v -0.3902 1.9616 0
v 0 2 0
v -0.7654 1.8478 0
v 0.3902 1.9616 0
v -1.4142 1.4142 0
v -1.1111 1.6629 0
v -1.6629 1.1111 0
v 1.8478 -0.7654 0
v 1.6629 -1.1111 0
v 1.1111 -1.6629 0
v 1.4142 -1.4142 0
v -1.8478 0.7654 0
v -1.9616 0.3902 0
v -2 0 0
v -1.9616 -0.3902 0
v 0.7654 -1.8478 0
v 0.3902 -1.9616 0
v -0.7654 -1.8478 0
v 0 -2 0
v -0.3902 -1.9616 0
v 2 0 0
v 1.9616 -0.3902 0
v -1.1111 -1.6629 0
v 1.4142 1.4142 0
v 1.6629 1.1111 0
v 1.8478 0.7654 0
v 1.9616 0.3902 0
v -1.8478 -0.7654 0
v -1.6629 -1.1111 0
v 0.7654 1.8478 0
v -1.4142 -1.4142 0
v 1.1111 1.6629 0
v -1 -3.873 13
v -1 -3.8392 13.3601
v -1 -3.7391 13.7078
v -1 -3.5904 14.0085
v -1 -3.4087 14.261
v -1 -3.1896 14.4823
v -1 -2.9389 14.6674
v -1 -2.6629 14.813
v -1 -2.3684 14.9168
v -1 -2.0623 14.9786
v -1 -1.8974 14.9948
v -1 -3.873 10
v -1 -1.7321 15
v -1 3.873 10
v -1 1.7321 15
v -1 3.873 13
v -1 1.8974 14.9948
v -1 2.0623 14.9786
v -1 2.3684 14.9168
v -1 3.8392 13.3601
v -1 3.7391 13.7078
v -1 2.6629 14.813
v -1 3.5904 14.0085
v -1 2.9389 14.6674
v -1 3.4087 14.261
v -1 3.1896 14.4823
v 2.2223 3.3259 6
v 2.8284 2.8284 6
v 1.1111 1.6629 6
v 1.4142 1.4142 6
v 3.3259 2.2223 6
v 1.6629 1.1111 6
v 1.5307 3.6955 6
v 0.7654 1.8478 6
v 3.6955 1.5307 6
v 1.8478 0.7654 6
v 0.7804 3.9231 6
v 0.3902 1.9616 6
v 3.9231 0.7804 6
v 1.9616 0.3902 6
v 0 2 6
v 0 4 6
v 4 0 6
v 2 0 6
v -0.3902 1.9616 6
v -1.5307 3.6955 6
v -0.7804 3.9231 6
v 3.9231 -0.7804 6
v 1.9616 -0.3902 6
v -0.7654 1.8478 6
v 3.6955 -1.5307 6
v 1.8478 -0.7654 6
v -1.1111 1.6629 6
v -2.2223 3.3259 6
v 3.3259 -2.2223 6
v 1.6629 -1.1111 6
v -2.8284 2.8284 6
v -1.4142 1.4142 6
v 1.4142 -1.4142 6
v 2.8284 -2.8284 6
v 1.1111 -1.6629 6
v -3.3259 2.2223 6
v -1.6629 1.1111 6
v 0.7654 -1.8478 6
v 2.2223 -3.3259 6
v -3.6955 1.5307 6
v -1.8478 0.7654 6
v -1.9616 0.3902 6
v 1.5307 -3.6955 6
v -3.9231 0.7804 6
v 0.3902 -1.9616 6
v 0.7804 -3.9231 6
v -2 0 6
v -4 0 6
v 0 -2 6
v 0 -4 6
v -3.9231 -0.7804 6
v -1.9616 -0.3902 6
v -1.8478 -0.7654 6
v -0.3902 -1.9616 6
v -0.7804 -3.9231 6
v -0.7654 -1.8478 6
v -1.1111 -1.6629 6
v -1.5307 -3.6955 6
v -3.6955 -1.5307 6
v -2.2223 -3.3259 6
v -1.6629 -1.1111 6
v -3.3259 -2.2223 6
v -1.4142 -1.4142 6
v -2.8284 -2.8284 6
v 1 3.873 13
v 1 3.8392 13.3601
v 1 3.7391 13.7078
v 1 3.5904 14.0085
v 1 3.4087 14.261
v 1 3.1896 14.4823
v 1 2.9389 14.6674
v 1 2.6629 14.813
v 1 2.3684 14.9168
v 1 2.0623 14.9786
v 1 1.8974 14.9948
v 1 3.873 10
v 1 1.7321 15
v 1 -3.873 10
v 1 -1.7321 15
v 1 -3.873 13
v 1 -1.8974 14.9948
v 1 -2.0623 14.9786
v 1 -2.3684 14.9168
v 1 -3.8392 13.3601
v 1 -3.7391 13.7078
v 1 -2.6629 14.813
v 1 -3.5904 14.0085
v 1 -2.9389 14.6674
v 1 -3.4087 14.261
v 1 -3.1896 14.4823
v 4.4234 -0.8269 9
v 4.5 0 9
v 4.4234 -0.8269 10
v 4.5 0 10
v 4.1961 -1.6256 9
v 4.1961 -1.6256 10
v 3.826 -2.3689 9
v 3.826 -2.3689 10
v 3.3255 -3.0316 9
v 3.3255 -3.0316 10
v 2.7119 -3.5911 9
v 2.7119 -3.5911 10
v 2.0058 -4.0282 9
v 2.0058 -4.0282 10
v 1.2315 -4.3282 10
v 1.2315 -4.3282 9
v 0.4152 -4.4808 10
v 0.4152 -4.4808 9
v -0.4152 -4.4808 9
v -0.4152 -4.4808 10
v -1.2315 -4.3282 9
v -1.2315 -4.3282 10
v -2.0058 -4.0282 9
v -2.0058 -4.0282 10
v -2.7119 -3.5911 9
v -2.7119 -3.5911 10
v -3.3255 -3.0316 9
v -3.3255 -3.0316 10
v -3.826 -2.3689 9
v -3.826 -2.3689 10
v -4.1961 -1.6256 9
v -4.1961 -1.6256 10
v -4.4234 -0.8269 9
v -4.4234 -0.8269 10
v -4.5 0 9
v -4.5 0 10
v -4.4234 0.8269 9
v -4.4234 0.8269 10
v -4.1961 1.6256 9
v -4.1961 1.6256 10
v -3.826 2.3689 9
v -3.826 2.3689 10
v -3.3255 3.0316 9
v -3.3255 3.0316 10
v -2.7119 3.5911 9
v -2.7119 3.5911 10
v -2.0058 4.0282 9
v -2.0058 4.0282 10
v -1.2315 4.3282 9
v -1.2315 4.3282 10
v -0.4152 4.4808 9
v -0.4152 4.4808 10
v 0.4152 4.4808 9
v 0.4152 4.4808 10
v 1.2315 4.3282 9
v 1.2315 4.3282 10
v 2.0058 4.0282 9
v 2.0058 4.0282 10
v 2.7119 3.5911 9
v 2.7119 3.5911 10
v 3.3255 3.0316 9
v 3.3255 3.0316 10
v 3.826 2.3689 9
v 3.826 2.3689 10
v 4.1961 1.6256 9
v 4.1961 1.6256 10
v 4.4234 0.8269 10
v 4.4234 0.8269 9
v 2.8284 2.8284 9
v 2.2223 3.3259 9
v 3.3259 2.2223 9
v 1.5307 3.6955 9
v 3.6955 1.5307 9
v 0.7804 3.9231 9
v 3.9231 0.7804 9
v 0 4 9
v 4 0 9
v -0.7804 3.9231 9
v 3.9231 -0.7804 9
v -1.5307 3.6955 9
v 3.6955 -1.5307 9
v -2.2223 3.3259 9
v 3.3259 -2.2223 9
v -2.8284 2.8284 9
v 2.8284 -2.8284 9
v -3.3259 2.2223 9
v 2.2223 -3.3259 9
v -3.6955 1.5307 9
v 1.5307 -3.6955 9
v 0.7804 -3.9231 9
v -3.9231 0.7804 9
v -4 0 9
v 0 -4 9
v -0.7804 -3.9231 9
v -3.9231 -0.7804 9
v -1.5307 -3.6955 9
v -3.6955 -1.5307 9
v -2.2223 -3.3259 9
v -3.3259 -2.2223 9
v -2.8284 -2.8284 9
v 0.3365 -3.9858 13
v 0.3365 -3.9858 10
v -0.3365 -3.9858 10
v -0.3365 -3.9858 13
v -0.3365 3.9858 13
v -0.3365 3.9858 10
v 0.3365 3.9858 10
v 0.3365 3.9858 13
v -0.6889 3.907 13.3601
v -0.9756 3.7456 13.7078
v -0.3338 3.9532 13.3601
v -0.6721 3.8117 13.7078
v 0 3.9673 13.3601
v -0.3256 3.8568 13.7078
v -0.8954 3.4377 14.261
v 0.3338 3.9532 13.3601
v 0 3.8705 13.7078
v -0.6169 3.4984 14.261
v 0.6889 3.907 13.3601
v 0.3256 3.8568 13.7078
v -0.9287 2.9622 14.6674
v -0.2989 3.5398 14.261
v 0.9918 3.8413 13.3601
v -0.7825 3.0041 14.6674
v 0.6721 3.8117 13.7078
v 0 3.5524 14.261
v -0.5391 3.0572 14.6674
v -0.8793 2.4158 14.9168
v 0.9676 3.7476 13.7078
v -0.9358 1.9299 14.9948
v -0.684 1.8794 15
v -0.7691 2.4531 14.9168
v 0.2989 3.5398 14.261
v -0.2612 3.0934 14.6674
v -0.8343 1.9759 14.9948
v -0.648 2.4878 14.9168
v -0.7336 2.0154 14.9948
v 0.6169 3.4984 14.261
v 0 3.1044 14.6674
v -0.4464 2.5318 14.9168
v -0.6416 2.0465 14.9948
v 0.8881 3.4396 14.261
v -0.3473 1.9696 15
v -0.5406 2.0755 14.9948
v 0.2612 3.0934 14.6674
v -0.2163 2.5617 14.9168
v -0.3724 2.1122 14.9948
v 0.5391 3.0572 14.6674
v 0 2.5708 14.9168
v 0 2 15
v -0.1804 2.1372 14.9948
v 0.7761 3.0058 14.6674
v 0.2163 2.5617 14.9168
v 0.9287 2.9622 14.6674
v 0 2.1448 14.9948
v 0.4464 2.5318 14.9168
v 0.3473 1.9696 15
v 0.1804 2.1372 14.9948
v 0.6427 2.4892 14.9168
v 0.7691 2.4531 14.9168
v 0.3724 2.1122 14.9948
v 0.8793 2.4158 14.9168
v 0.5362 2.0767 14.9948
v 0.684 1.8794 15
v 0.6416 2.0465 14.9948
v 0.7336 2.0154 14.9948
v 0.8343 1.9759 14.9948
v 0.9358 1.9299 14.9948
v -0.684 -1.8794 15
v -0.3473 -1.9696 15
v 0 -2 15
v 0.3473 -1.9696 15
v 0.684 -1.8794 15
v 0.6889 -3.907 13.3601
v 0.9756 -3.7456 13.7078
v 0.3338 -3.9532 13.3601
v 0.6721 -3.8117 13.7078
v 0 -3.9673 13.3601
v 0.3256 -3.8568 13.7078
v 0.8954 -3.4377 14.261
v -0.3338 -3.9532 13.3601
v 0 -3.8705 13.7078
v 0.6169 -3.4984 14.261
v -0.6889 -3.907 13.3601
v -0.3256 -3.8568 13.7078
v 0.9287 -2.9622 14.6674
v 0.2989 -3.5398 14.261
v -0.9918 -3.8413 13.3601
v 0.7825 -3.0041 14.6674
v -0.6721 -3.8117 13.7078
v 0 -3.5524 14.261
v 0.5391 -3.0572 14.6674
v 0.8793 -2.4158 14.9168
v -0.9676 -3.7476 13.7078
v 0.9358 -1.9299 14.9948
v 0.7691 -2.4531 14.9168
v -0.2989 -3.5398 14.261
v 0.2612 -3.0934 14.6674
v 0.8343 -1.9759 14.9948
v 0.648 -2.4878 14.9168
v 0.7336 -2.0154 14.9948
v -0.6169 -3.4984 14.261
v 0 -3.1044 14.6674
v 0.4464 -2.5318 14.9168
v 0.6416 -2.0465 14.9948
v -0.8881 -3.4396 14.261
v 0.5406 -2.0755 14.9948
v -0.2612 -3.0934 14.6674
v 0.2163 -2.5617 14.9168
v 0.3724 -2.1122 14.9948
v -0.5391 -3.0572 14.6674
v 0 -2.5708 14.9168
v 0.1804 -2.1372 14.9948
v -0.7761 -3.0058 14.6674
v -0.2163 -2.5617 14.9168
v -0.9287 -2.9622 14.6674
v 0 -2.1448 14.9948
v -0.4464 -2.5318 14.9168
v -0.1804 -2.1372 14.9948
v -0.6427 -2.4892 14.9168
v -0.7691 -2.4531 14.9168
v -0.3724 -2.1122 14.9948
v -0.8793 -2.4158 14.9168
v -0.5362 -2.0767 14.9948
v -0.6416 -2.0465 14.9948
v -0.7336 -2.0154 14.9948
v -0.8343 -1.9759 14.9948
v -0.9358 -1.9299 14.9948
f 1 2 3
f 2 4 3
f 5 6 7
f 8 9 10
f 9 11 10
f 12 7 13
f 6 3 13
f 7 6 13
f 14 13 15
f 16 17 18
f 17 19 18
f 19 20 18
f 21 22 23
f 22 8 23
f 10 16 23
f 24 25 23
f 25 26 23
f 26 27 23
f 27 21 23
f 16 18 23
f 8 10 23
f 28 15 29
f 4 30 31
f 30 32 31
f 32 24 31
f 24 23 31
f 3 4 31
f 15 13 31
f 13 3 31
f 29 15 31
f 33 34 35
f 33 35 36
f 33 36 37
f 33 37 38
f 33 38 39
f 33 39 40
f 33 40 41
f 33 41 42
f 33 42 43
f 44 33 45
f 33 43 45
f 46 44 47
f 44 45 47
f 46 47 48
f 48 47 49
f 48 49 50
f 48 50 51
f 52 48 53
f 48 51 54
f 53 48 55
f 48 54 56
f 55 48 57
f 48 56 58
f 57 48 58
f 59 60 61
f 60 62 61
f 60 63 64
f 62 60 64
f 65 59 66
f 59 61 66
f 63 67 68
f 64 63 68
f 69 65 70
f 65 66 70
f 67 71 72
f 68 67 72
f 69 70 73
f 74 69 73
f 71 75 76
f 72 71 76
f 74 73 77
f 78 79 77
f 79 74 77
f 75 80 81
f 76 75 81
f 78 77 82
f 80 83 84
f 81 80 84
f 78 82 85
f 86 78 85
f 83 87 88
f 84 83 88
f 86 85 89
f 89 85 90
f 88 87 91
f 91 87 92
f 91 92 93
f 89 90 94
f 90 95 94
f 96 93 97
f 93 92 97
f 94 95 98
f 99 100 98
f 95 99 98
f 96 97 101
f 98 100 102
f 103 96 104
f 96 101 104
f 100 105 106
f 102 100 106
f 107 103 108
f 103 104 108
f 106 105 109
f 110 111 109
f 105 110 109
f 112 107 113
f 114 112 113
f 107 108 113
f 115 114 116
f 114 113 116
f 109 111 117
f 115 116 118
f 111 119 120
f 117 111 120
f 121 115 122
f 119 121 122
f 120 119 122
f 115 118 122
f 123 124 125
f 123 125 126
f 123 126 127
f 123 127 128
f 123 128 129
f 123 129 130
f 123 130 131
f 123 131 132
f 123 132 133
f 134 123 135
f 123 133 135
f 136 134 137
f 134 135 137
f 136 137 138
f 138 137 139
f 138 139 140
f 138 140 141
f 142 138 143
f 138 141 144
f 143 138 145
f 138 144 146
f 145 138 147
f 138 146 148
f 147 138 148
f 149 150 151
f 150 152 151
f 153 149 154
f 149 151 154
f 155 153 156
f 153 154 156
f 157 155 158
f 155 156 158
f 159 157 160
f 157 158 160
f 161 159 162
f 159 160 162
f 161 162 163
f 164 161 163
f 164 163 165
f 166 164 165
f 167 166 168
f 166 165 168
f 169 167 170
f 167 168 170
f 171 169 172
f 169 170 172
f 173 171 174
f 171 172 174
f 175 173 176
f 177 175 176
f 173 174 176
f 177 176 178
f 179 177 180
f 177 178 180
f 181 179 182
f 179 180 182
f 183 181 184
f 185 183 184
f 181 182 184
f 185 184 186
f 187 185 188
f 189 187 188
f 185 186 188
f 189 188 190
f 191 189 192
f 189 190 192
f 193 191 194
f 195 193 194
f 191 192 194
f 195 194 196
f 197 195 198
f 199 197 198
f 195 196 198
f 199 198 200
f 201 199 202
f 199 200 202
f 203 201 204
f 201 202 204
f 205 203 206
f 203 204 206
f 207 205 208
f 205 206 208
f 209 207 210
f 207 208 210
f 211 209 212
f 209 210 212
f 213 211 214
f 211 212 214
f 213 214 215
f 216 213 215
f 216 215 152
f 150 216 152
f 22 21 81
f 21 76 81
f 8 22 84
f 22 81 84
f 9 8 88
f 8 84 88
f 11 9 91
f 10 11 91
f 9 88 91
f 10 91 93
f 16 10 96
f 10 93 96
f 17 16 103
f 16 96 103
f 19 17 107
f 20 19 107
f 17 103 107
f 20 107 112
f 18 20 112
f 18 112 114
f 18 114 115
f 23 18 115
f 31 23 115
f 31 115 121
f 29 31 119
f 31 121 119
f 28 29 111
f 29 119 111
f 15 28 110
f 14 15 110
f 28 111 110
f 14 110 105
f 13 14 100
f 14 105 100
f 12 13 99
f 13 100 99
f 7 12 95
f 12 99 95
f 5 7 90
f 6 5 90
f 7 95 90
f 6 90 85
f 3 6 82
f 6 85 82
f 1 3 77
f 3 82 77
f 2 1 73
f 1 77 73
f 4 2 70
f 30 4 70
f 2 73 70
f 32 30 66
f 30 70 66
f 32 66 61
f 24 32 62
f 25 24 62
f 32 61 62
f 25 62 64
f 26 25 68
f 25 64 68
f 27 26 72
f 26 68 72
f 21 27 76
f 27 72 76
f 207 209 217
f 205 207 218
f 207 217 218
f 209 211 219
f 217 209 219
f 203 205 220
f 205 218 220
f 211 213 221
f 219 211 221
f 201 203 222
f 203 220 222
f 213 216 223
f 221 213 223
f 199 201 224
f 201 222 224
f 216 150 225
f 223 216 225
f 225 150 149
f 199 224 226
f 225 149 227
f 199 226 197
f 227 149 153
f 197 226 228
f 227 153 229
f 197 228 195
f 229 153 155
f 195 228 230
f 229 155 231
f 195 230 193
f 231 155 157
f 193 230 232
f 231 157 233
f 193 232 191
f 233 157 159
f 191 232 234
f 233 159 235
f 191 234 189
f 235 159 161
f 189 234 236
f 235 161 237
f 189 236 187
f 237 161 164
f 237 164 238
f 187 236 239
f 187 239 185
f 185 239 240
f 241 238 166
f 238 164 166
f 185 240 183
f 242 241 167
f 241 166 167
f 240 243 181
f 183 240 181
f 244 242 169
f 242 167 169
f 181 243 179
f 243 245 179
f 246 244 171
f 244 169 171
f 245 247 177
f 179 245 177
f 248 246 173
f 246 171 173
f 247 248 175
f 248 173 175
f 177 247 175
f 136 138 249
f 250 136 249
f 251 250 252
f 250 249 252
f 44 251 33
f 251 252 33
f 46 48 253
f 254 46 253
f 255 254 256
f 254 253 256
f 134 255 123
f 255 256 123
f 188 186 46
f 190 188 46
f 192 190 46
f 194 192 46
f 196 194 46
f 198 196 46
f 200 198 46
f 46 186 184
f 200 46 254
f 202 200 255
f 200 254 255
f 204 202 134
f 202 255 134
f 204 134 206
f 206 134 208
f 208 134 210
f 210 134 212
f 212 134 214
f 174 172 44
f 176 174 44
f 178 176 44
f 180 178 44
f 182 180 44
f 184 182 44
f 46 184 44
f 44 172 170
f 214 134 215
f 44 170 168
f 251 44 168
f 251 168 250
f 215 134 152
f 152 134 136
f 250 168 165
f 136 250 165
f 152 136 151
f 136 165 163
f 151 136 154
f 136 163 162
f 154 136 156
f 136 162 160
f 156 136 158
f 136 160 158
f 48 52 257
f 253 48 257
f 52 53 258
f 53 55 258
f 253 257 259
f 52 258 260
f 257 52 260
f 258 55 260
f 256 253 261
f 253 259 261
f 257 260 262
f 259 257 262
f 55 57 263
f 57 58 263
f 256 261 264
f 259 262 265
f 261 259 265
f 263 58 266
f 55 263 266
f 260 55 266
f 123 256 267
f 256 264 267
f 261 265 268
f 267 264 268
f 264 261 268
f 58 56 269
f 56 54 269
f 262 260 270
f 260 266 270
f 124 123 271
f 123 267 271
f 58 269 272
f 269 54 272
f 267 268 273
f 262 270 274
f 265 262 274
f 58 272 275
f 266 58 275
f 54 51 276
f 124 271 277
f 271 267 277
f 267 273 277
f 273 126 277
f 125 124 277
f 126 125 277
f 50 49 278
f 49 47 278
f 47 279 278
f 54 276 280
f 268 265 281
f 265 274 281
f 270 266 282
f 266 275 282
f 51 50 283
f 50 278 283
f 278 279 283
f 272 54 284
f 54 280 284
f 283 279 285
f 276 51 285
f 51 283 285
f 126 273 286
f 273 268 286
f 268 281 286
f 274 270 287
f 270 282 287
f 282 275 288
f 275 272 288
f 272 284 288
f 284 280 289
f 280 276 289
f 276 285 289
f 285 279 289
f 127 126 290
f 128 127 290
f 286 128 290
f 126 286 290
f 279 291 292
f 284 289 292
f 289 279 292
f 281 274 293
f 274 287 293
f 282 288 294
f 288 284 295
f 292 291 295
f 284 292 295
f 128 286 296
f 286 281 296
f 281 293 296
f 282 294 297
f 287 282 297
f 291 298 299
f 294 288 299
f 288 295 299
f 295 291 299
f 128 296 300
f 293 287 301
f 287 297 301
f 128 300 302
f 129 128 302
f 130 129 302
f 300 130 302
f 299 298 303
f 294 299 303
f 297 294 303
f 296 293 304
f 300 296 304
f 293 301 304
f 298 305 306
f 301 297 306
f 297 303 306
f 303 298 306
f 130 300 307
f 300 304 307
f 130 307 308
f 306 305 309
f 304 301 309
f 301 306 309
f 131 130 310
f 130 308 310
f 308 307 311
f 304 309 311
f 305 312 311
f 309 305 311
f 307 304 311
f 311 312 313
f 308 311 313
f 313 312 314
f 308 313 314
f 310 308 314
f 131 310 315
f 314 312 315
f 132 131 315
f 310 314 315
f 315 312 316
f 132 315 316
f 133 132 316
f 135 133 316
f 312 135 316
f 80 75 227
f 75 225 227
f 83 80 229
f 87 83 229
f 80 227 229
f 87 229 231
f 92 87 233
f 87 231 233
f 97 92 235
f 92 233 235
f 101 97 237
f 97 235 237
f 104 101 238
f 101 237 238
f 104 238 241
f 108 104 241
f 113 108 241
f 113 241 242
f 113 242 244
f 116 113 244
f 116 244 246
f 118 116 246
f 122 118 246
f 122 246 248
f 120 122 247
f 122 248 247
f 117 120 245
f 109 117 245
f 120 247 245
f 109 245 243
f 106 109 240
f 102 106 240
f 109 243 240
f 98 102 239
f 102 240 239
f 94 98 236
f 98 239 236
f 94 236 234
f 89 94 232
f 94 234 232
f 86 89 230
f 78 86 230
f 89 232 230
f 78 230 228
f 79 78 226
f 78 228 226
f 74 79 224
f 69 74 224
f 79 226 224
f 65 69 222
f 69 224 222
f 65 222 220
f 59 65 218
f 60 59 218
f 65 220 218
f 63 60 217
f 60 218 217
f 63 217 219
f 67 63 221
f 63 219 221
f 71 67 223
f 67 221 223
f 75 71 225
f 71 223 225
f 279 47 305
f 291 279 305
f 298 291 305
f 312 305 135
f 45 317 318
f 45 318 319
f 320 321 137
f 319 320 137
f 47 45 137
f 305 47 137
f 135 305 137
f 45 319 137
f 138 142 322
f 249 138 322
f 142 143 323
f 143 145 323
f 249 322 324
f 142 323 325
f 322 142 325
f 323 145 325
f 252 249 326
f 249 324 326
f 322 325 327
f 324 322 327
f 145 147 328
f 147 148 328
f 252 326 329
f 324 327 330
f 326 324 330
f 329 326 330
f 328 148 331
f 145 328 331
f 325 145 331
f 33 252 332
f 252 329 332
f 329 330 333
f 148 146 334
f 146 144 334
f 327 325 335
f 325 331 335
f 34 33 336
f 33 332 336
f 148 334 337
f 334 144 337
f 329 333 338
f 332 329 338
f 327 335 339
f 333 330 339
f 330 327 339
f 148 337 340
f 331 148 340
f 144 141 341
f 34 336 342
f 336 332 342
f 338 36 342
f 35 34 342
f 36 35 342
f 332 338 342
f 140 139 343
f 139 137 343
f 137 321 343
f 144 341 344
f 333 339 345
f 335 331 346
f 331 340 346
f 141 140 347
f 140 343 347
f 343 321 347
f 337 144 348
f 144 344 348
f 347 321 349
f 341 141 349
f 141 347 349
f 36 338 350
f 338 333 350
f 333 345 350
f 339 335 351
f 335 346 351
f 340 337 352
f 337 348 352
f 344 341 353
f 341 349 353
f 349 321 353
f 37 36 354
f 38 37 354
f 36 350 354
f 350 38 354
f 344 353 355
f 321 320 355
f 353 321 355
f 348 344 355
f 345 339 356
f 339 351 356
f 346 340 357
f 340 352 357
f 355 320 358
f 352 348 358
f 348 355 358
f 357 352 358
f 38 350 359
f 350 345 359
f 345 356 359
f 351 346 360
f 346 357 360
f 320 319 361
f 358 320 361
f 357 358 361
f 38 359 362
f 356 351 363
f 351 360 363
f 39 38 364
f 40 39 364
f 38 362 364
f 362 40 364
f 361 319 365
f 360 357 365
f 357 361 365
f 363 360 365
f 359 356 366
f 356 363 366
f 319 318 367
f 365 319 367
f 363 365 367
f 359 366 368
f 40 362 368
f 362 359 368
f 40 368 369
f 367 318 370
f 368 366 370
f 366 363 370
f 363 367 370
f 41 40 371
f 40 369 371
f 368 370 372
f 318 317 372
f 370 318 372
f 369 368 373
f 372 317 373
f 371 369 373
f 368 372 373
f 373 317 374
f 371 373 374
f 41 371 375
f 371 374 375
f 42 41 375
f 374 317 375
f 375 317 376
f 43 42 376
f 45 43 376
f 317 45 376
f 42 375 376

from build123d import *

# Parameters (mm, degrees)
F3_DEPTH = 5
F4_R     = 2


with BuildPart() as f1:
    # F0 (on Front) → F1 (revolve)
    with BuildSketch(Plane.XZ):
        Polygon((0, 15), (0, 0), (2, 0), (2, 6), (4, 6), (4, 9), (4.5, 9), (4.5, 10), (4, 10), (4, 15), align=None)
    revolve(axis=Axis((0, 0, 7.5), (0, 0, -1)))

    # F2 (on face) → F3 (cut, through all)
    with BuildSketch(Plane.XY.offset(15)):
        with BuildLine():
            Line((-1, -3.8729833462), (-1, 3.8729833462))
            ThreePointArc((-1, 3.8729833462), (-4, 0), (-1, -3.8729833462))
        make_face()
        with BuildLine():
            ThreePointArc((4, 0), (3.1622776602, 2.4494897428), (1, 3.8729833462))
            Line((1, 3.8729833462), (1, -3.8729833462))
            ThreePointArc((1, -3.8729833462), (3.1622776602, -2.4494897428), (4, 0))
        make_face()
    extrude(amount=-F3_DEPTH, mode=Mode.SUBTRACT)

    # F4
    f4_edges = [f1.edges().sort_by_distance(p)[0] for p in [
        (0, -4, 15),
        (0, 4, 15),
    ]]
    fillet(f4_edges, radius=F4_R)


solid = f1.part
